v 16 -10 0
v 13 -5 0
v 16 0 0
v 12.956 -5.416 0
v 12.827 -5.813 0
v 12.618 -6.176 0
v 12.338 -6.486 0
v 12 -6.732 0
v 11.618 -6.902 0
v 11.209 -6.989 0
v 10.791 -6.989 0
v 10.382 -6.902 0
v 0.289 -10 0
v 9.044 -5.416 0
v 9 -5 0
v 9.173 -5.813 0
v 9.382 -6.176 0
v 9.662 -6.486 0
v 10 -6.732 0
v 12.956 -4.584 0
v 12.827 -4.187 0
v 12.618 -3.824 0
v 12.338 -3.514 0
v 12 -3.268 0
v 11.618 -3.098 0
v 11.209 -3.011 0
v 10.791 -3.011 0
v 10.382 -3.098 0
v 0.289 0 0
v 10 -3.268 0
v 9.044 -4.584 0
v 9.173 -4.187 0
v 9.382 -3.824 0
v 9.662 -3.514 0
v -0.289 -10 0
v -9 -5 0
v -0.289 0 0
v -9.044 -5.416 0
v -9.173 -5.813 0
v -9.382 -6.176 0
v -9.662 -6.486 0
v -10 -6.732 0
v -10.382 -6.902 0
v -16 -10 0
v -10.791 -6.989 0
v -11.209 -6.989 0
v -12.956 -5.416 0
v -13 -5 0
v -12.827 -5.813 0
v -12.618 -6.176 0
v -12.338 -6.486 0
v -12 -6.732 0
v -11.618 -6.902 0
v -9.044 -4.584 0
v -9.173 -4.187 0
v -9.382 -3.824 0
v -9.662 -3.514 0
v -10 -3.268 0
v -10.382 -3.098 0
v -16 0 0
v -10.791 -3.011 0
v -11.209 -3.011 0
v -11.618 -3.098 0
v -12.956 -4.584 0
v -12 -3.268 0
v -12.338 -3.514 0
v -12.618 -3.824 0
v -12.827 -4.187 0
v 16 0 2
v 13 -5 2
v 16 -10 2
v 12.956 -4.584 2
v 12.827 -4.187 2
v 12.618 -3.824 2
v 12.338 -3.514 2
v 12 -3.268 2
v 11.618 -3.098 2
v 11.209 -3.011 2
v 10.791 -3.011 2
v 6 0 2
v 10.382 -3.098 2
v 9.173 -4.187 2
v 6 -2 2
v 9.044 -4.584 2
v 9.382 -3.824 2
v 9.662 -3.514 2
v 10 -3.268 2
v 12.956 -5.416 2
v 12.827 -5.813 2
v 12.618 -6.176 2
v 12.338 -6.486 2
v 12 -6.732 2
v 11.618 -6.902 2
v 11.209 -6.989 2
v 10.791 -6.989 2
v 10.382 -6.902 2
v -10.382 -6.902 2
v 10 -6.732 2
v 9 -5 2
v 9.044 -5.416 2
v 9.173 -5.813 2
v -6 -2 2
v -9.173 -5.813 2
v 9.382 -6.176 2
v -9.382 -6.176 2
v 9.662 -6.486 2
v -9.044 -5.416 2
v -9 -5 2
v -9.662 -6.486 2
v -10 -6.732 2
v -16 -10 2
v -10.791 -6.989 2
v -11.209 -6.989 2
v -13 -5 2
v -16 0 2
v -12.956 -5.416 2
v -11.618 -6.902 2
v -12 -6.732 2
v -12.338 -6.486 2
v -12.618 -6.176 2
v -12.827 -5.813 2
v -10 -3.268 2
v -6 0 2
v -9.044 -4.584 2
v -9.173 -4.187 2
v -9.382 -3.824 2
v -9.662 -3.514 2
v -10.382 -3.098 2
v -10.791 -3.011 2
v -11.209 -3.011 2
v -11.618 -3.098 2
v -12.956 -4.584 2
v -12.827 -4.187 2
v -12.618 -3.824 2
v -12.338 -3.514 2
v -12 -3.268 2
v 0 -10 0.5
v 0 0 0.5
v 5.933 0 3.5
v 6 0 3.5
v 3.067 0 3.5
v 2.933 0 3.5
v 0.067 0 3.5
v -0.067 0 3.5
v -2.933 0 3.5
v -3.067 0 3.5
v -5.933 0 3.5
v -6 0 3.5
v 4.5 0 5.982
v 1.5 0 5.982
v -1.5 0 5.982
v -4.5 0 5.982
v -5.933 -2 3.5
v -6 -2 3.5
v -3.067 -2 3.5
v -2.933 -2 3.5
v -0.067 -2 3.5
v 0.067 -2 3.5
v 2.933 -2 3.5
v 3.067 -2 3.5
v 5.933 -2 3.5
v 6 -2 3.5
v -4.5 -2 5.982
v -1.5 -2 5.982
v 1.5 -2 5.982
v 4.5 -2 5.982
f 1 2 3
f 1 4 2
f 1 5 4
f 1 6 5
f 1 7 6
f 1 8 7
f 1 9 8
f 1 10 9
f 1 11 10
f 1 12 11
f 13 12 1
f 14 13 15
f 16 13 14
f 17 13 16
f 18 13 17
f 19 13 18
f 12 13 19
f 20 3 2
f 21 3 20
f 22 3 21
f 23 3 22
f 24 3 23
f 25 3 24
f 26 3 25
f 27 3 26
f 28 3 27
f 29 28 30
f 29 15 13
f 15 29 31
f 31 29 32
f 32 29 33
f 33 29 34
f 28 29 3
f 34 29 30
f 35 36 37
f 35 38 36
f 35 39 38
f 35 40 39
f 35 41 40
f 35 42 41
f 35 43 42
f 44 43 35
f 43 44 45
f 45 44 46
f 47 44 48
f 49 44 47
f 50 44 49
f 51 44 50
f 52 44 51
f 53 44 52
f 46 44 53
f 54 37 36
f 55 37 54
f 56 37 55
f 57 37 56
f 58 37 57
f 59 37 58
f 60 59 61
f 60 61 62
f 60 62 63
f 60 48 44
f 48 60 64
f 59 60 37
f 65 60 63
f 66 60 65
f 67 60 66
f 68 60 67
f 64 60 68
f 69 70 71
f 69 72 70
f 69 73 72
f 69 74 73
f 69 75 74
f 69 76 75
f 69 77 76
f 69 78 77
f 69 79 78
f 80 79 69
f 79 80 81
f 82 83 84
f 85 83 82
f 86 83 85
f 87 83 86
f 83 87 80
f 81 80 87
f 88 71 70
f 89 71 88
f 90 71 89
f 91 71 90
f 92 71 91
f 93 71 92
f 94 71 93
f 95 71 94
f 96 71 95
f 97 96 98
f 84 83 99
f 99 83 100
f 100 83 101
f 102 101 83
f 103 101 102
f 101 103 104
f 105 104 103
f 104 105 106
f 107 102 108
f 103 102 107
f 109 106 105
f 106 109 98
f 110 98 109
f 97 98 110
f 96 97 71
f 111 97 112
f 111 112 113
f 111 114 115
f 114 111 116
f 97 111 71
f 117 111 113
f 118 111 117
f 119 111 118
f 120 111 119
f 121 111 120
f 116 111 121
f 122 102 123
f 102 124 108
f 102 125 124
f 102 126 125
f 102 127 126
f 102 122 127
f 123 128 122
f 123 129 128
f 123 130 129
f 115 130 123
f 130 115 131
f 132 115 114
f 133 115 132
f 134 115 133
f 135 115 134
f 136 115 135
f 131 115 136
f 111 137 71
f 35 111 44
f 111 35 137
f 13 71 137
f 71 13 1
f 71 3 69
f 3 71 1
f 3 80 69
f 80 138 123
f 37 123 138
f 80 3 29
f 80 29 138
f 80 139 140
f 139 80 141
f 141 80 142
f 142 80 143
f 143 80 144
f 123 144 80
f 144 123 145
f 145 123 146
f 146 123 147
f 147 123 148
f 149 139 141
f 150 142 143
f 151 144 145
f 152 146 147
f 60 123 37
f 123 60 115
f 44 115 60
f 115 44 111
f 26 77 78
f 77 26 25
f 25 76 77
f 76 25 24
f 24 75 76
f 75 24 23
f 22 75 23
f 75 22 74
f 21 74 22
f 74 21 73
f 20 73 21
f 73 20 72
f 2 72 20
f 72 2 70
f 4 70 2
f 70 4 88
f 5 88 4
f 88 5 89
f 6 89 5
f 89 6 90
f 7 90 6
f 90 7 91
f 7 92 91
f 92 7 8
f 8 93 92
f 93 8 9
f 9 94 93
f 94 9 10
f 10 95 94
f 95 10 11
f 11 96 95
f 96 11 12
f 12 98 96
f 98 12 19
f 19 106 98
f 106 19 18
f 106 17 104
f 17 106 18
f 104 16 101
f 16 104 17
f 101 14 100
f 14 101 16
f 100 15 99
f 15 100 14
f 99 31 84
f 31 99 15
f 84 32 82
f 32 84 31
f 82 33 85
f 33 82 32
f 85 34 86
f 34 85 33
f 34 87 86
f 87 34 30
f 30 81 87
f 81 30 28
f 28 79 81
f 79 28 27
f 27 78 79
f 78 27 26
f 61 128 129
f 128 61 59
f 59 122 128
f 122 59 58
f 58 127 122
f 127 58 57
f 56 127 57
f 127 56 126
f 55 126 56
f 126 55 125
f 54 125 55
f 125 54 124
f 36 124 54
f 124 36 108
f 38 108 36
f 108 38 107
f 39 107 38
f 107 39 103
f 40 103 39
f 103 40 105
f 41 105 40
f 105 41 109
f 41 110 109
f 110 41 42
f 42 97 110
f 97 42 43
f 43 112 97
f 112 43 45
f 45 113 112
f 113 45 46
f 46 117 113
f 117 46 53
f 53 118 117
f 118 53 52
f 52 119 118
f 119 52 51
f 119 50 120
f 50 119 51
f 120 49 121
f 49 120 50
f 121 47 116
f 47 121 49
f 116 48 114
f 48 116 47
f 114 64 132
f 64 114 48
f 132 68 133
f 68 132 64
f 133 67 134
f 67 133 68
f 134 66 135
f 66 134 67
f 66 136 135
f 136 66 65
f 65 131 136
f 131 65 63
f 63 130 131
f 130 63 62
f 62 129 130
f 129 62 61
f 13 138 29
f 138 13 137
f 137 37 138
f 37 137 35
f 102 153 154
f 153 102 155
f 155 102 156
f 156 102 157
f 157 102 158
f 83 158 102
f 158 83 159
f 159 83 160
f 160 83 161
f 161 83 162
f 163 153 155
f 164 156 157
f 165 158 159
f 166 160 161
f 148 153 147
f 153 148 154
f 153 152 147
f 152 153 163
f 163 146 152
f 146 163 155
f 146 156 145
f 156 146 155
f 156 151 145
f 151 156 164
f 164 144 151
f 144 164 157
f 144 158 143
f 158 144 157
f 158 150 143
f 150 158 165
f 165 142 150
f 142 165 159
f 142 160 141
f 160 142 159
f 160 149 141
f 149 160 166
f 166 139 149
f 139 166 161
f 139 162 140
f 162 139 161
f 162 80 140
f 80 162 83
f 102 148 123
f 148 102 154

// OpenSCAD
/* [Global] */
// thickness of the walls
thickness = 2; // [3:8]

// depth; limited by the distance between the canvas and the wall
depth = 10; // [8:20]

// height of the teeth (from the base to the tip of the tooth)
teeth_height = 3; // [2:20]

// number of teeth. Even number!
number_of_teeth = 4; // [2:10]

// width of each tooth
tooth_width = 3; // [2:10]

// diameter of the screw hole
hole_diameter = 4; // [2:10];

/* [Hidden] */
teeth_width = number_of_teeth * tooth_width;
width = teeth_width + (depth * 2);

main();

module main()
{
  rotate([0,0,180])
  translate([-width * 0.5, 0, 0])
    union()
    {
      flat_bit();
      teeth();
    }
}

module flat_bit()
{
  difference()
  {
    linear_extrude(thickness)
      flat_bit_shape();
    centre_notch();
  }
}

module flat_bit_shape()
{
  difference()
  {
    square(size=[width,depth]);
    translate([depth*0.5, depth*0.5])
      circle(d=hole_diameter, $fn = 30);
    translate([width - (depth*0.5), depth*0.5])
      circle(d=hole_diameter, $fn = 30);
  }
}

module centre_notch()
{
  translate([width*0.5, 0, 0])
  rotate([-90,0,0])
  linear_extrude(depth)
  {
    rotate([0,0,30])
    circle(d=1, $fn=3);
  }
}

module teeth()
{
  translate([(width-teeth_width)/2,thickness,thickness])
    rotate([90,0,0])
      linear_extrude(thickness)
        teeth_shape();
}

module teeth_shape()
{
  rectangle_height = teeth_height - (tooth_width * cos(60));
  x_offset = (tooth_width * 0.5) + teeth_width - (tooth_width * number_of_teeth);
  y_offset = teeth_height - (tooth_width * cos(60) * 0.5);

  union()
  {
    square(size=[teeth_width,rectangle_height]);
    for (i=[0:number_of_teeth-1]) {
      translate([x_offset + (tooth_width * i), y_offset])
        rotate([0,0,-30])
          circle(d=tooth_width / sin(60), $fn = 3);
    }

  }
}
